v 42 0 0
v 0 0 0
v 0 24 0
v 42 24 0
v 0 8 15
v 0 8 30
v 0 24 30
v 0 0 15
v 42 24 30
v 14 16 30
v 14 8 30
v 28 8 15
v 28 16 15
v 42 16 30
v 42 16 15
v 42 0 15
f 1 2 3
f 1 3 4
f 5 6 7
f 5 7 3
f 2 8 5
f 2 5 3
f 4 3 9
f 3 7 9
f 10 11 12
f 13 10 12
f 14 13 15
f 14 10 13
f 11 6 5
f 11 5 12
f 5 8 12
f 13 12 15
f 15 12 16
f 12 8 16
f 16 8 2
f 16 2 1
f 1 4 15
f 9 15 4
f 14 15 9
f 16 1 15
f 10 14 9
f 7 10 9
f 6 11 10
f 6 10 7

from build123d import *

# Parameters (mm, degrees)
F1_DEPTH = 24
F2_DEPTH = 8
F3_DEPTH = 16


with BuildPart() as f1:
    # F0 (on Front) → F1 (new body)
    with BuildSketch(Plane.XZ):
        Polygon((0, 15), (0, 0), (42, 0), (42, 15), (28, 15), align=None)
        Polygon((0, 30), (0, 15), (28, 15), (14, 30), align=None)
        Polygon((28, 15), (42, 15), (42, 30), (14, 30), align=None)
    extrude(amount=-F1_DEPTH)

    # F0 (on Front) → F2 (cut)
    with BuildSketch(Plane.XZ):
        Polygon((0, 30), (0, 15), (28, 15), (14, 30), align=None)
        Polygon((28, 15), (42, 15), (42, 30), (14, 30), align=None)
    extrude(amount=-F2_DEPTH, mode=Mode.SUBTRACT)

    # F0 (on Front) → F3 (cut)
    with BuildSketch(Plane.XZ):
        Polygon((28, 15), (42, 15), (42, 30), (14, 30), align=None)
    extrude(amount=-F3_DEPTH, mode=Mode.SUBTRACT)


solid = f1.part
